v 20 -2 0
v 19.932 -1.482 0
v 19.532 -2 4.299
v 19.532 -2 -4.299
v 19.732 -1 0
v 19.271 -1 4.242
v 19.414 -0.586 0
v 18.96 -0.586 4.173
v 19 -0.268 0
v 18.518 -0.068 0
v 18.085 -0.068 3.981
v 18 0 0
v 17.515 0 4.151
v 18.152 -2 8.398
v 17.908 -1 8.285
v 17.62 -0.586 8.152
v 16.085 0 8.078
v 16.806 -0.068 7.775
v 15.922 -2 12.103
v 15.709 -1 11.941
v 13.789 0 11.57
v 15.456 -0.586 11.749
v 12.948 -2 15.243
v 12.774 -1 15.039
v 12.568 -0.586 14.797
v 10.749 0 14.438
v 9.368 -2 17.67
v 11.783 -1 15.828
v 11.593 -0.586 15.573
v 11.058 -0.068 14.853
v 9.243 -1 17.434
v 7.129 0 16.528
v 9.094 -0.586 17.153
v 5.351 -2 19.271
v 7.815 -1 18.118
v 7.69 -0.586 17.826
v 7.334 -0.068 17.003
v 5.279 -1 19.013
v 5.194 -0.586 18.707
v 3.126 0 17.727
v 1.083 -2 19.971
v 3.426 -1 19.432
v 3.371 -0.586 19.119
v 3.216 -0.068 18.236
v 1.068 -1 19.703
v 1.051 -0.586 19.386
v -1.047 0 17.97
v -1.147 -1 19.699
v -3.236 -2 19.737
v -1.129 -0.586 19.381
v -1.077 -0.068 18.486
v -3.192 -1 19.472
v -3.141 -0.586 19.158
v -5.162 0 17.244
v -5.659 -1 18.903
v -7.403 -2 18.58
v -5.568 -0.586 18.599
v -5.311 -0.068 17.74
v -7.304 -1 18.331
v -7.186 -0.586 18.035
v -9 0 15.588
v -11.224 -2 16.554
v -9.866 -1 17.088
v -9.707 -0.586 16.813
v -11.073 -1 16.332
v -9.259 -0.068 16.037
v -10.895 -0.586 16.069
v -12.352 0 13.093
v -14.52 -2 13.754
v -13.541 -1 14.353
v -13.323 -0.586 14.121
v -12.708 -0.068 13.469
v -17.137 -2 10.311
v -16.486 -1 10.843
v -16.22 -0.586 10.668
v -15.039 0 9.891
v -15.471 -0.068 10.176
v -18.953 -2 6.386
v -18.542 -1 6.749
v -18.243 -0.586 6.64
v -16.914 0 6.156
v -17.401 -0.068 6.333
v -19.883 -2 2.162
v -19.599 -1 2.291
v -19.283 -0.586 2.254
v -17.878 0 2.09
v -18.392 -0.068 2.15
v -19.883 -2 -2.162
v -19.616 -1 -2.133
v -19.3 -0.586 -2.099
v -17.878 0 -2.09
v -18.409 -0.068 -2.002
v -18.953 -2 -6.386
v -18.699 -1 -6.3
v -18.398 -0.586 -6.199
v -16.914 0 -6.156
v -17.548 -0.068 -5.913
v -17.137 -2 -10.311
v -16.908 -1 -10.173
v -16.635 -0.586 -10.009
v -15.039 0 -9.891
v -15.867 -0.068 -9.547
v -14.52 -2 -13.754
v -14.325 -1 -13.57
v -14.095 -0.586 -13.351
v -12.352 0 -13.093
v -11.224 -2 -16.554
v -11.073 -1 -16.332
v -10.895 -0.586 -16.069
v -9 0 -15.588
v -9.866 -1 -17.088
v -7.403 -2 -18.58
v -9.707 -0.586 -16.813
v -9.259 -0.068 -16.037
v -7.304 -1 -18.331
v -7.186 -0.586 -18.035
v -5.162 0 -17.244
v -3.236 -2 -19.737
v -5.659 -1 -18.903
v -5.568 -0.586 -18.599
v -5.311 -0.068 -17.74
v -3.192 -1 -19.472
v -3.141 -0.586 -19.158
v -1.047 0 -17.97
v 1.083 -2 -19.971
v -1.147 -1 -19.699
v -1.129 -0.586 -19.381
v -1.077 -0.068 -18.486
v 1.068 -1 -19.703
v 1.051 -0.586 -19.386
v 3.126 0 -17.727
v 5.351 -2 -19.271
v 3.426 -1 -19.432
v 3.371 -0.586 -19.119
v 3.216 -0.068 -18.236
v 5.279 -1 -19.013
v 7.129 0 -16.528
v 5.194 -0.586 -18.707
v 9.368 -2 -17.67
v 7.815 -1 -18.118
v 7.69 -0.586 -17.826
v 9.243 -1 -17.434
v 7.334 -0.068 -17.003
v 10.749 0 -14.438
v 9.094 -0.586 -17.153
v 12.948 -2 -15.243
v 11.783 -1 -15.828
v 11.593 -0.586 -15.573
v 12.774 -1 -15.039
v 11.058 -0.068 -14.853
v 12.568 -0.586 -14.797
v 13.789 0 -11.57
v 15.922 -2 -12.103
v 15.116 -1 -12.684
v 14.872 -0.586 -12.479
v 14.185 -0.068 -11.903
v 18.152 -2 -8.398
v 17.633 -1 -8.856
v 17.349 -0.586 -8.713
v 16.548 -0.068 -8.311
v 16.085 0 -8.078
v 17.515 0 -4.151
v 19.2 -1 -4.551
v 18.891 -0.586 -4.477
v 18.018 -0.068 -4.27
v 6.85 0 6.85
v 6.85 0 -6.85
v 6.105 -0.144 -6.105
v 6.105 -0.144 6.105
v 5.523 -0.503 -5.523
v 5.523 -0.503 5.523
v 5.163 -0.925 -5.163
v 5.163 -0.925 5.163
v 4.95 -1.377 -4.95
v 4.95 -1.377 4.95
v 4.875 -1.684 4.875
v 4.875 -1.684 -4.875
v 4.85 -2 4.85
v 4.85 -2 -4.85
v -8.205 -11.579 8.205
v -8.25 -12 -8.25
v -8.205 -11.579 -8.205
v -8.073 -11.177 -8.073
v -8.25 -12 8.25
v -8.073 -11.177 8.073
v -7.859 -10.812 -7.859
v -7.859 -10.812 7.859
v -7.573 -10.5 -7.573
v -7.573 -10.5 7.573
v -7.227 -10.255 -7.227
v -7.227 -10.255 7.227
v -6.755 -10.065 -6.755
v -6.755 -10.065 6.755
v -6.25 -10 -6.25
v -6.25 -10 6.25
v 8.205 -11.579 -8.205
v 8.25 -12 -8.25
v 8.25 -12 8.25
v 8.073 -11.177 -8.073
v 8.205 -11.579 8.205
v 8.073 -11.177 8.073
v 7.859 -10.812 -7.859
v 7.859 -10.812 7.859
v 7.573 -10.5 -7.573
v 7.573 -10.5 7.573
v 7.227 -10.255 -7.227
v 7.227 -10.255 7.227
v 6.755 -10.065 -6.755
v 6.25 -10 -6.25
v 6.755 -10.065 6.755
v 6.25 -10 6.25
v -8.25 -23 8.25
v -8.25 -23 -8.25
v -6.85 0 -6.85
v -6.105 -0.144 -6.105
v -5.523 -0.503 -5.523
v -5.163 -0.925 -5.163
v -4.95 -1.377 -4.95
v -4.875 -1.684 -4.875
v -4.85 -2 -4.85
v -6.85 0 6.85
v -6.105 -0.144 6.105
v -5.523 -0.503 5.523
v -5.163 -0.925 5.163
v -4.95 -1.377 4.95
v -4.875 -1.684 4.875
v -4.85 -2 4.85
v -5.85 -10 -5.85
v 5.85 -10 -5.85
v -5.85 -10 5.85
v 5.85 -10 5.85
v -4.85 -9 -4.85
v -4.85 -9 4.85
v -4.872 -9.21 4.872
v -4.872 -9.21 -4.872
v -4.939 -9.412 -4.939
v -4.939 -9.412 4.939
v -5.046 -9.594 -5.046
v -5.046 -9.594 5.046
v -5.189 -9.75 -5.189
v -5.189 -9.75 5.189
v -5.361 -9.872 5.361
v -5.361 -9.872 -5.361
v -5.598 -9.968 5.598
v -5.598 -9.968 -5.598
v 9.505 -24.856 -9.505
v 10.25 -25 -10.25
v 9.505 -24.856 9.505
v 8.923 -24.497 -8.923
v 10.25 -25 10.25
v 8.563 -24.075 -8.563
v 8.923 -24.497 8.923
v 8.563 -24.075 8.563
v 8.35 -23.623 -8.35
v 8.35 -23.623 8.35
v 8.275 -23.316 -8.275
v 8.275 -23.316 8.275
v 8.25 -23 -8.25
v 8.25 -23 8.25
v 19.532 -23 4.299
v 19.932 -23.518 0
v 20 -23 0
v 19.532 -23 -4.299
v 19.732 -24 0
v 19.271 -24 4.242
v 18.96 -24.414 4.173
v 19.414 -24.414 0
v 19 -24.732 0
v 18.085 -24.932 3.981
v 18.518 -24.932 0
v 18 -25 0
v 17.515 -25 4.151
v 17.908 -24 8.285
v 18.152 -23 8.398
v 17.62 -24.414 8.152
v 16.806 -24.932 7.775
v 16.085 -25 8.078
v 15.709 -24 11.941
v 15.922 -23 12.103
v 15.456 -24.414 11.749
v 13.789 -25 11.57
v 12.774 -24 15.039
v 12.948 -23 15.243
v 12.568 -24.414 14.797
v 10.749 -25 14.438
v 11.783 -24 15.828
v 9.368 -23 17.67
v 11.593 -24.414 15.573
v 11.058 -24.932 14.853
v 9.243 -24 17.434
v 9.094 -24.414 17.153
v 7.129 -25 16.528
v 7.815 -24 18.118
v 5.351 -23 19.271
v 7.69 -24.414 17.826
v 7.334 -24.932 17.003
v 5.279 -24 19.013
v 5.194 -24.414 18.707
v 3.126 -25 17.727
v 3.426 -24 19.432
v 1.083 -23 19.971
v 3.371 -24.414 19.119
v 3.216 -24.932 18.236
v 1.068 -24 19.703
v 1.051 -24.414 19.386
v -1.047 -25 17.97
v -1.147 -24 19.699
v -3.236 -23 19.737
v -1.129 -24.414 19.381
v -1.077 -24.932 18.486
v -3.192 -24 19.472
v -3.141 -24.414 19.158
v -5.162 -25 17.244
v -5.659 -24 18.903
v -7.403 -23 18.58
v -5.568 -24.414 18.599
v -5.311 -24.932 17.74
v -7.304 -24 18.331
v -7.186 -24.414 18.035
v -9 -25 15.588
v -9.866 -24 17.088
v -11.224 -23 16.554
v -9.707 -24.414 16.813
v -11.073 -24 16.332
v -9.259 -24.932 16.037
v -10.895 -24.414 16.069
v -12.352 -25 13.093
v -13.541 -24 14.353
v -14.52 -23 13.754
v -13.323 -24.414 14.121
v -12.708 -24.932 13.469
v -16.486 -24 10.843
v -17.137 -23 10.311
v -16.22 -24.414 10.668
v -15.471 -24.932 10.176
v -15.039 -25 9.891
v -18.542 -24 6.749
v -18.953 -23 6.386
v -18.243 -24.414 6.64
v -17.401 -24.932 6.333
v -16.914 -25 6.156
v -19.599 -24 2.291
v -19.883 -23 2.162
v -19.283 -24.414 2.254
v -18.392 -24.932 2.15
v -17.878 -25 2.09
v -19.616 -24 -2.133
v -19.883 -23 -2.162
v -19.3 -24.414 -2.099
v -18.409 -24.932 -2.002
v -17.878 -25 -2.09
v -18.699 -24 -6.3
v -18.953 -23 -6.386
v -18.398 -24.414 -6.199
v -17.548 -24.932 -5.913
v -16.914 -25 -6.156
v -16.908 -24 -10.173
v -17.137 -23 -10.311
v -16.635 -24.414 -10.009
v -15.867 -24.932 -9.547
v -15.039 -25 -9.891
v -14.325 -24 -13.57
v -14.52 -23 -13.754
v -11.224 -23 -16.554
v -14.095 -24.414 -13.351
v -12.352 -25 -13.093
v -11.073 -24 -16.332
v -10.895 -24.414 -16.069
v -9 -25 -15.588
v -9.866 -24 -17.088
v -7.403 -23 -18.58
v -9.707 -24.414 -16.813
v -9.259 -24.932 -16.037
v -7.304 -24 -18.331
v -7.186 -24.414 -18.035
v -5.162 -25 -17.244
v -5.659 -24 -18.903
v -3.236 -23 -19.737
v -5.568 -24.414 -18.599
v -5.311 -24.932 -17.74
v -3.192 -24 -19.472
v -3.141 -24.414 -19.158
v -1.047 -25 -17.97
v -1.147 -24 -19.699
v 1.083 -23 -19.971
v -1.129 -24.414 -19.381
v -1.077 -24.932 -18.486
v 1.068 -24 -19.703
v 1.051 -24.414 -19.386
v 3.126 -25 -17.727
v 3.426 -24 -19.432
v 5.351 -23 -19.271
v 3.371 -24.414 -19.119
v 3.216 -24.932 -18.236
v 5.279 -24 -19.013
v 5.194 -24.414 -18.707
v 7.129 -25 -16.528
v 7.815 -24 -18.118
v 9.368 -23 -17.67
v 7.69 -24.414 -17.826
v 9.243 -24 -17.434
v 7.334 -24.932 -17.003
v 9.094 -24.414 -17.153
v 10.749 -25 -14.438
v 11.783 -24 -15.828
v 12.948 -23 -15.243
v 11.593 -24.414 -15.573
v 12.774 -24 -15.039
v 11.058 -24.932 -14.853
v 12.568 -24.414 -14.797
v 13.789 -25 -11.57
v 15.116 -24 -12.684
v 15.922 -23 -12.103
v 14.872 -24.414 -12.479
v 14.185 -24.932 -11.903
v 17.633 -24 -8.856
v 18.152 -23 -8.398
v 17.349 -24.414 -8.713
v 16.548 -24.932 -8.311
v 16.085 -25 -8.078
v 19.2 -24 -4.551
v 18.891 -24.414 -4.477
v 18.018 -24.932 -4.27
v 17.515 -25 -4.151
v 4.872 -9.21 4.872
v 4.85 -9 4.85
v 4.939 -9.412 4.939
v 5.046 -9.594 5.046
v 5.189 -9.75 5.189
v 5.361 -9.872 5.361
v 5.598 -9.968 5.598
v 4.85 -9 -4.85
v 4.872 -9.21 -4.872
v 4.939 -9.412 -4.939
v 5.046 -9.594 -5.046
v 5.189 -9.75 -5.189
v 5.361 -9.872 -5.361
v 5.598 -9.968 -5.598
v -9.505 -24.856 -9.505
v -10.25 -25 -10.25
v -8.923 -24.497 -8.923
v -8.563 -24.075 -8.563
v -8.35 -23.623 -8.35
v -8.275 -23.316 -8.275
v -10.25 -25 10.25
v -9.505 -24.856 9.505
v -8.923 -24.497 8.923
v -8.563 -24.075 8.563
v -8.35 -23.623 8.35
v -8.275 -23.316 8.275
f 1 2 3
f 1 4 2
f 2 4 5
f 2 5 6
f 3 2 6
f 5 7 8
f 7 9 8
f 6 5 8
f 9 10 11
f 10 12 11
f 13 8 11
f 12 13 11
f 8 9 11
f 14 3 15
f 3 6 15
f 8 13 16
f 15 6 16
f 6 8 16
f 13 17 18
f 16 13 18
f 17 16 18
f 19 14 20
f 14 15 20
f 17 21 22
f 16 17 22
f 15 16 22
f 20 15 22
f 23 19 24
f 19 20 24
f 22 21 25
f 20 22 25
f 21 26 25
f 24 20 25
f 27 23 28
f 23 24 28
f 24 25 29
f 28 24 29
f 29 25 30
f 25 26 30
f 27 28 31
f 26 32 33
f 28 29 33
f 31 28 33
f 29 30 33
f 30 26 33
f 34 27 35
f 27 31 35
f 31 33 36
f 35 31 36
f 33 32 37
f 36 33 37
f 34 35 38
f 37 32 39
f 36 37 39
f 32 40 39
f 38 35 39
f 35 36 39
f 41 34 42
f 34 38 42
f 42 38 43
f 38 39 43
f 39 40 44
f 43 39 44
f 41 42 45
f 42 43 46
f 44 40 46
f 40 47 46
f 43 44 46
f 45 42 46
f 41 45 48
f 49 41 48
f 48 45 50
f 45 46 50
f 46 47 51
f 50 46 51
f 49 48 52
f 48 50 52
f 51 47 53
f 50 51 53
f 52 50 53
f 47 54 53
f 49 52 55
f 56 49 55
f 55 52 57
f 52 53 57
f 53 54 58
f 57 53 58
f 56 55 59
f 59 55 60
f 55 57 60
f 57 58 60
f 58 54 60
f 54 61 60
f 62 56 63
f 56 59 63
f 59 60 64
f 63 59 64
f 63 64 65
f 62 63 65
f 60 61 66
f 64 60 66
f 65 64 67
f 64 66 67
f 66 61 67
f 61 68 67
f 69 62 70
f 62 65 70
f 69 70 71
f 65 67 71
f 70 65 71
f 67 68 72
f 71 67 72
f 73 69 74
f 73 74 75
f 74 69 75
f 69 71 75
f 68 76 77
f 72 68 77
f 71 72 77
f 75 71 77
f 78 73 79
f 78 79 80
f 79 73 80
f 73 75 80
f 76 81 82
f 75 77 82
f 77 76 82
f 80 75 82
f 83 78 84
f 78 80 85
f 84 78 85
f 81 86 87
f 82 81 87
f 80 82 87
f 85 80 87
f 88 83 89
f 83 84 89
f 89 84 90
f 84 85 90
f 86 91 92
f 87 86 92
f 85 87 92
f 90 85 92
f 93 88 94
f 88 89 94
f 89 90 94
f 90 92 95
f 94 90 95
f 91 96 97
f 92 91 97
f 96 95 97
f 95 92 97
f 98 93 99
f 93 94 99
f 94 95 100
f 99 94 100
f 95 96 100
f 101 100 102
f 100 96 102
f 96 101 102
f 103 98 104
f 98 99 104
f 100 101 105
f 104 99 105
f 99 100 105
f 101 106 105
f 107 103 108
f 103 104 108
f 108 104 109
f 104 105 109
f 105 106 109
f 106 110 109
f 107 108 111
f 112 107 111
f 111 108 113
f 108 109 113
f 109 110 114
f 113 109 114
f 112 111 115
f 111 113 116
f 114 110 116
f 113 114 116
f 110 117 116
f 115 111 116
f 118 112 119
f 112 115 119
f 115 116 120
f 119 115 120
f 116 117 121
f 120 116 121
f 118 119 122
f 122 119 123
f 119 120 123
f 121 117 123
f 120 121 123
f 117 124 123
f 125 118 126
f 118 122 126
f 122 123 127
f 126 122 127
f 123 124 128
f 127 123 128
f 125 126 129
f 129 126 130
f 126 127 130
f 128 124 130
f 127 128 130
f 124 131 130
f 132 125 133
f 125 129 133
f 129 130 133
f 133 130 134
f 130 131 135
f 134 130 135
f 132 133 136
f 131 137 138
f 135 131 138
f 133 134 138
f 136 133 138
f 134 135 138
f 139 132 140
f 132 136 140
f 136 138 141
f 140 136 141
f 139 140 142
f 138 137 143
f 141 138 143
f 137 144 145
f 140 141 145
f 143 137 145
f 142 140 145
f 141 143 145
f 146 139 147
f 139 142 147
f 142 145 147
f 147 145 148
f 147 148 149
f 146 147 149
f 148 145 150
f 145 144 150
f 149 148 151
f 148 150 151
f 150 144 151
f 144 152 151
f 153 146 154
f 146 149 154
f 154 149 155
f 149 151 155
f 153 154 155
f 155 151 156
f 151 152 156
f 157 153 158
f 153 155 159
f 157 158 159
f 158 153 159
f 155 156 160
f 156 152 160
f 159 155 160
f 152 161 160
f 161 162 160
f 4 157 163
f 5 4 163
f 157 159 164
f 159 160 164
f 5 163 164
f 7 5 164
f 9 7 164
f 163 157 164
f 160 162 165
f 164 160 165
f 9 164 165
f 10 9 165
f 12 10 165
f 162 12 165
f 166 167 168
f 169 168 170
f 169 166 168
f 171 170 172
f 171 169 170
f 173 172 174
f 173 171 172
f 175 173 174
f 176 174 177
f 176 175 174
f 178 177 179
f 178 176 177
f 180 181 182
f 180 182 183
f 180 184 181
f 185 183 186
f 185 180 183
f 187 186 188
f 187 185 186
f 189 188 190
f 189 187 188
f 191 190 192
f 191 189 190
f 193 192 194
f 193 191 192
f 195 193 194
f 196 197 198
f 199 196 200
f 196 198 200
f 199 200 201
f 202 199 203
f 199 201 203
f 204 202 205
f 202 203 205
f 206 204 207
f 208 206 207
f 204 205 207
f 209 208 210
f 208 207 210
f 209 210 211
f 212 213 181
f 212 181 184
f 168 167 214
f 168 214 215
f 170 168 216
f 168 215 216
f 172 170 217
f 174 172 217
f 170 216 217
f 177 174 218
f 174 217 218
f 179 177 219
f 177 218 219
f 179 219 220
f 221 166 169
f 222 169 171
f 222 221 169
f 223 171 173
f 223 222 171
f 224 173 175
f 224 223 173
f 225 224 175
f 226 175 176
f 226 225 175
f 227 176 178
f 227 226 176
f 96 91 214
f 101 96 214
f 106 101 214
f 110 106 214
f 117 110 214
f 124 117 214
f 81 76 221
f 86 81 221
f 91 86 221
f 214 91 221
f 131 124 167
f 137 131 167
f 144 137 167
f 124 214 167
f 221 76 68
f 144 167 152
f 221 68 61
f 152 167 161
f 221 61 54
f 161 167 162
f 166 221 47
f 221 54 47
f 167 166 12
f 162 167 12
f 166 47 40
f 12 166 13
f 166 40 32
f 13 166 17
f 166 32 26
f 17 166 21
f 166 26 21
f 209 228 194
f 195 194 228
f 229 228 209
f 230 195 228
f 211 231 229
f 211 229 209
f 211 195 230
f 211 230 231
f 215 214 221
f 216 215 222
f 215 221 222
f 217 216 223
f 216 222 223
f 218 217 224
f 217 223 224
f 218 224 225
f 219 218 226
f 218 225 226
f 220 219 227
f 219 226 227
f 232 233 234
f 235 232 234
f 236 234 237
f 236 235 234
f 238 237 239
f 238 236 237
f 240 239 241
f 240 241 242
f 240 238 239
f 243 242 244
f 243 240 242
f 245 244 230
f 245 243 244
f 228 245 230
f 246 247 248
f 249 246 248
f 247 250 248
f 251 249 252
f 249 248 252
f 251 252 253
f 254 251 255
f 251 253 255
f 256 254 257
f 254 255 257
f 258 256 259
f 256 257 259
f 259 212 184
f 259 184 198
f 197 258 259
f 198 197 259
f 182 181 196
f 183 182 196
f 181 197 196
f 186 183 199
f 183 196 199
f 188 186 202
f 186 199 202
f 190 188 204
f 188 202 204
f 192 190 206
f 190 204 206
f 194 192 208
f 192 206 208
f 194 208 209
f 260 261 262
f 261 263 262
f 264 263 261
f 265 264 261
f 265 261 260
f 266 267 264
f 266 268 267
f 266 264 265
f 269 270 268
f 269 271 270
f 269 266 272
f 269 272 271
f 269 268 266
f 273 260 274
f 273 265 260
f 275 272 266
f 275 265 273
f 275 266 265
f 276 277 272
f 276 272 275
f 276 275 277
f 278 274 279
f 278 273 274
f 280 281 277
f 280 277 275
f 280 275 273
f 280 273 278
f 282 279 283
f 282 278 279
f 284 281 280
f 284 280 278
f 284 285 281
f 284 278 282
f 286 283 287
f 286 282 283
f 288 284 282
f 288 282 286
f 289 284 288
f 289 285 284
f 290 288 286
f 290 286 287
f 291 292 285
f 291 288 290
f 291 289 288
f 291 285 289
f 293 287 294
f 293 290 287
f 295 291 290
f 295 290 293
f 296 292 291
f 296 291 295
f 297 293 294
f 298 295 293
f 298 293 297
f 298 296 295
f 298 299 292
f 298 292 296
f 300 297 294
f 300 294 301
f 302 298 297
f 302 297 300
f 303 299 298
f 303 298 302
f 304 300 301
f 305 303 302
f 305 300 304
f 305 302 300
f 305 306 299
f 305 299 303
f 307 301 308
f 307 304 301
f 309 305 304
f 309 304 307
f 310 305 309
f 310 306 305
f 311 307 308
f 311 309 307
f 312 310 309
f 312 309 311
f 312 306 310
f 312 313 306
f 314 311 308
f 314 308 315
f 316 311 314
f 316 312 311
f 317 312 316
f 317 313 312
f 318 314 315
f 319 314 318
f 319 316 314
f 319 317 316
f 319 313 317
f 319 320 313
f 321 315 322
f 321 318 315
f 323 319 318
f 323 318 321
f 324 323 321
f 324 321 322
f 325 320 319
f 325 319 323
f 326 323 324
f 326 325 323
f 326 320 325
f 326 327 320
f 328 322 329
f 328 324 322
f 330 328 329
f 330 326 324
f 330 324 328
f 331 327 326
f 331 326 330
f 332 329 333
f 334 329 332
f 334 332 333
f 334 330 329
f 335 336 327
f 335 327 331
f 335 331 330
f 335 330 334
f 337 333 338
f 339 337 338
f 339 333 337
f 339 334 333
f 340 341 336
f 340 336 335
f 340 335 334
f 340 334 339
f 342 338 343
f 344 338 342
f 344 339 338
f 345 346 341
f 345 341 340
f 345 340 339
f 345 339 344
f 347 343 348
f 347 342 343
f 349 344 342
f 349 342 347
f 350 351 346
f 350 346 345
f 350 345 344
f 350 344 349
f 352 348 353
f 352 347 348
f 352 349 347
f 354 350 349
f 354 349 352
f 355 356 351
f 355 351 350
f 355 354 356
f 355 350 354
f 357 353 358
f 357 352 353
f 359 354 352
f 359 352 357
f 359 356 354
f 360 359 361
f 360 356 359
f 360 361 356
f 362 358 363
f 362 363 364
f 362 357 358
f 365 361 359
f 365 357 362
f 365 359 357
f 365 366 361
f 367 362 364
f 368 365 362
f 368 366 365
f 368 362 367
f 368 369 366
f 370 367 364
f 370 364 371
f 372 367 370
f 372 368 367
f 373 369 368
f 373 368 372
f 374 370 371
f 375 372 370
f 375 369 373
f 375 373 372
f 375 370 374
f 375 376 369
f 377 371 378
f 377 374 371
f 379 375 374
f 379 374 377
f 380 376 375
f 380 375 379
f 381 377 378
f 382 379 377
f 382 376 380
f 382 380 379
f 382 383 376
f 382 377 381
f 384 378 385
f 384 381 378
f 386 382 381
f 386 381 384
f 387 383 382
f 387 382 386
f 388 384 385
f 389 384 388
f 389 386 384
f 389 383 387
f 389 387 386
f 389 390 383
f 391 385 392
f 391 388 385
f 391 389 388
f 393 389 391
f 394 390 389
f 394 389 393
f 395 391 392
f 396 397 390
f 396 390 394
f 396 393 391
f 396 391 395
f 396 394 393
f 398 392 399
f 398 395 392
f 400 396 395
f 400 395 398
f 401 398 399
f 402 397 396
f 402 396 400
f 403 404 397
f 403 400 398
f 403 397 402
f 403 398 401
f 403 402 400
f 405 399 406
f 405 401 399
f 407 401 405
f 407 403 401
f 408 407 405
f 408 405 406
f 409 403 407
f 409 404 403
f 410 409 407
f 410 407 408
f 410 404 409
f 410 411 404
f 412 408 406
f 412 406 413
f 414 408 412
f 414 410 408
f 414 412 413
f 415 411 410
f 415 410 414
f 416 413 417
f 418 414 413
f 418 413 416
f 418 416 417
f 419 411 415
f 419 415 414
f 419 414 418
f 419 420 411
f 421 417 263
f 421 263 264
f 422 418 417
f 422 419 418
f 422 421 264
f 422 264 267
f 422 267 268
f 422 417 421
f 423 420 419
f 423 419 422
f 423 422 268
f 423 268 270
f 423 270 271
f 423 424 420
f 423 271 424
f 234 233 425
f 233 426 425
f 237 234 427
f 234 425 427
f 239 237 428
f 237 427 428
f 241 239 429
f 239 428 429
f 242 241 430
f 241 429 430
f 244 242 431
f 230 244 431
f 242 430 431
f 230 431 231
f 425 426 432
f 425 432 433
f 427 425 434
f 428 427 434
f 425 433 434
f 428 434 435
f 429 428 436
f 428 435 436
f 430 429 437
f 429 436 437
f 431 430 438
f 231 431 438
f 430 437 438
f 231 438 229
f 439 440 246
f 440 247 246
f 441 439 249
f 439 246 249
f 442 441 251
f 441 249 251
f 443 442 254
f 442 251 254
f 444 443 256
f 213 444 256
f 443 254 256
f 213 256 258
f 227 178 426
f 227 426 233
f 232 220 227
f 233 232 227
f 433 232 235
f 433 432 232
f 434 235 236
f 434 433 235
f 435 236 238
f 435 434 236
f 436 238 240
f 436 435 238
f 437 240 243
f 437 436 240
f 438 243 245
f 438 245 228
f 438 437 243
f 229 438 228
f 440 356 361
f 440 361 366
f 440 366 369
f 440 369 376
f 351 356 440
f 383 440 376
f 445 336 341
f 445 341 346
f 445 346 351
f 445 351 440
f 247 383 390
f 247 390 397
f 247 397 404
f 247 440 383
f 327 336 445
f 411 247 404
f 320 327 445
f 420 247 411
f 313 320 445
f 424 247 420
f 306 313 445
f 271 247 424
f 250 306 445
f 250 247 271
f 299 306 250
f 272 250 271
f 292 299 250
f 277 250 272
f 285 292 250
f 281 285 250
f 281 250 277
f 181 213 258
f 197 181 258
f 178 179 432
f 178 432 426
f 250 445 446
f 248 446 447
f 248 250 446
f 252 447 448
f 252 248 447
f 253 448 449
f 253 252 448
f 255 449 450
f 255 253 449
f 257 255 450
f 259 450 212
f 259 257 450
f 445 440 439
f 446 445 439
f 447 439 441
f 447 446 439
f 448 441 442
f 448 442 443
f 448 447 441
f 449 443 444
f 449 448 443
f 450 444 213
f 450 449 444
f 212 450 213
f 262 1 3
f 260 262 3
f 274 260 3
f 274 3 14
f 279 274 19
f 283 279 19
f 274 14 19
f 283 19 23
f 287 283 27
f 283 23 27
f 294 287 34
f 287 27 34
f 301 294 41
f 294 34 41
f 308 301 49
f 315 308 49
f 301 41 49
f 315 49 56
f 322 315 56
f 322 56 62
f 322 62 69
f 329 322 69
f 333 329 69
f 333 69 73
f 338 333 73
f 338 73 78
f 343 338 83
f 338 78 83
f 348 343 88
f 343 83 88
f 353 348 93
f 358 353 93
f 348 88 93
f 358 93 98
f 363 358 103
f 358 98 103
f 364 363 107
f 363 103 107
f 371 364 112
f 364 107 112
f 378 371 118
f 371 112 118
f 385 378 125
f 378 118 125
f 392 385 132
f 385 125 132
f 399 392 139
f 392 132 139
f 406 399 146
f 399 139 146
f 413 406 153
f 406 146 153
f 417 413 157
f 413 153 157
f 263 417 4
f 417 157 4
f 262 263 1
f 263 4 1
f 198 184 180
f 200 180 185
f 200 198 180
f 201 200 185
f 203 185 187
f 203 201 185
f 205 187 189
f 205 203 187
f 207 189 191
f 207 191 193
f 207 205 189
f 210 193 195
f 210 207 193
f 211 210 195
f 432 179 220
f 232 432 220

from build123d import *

# Parameters (mm, degrees)
F0_R     = 20
F1_DEPTH = 25
F2_W     = 16.5
F2_H     = 16.5
F3_DEPTH = 15
F4_W     = 9.7
F4_H     = 9.7
F5_DEPTH = 25
F6_R     = 2
F7_R     = 1


with BuildPart() as f1:
    # F0 (on Front) → F1 (new body)
    with BuildSketch(Plane.XZ):
        Circle(F0_R)
    extrude(amount=F1_DEPTH)

    # F2 (on face) → F3 (cut)
    with BuildSketch(Plane.XZ.offset(25)):
        Rectangle(F2_W, F2_H)
    extrude(amount=-F3_DEPTH, mode=Mode.SUBTRACT)

    # F4 (on face) → F5 (cut)
    with BuildSketch(Plane(origin=(0, 0, 0), x_dir=(-1, 0, 0), z_dir=(0, 1, 0))):
        Rectangle(F4_W, F4_H)
    extrude(amount=-F5_DEPTH, mode=Mode.SUBTRACT)

    # F6
    f6_edges = [f1.edges().sort_by_distance(p)[0] for p in [
        (0, -10, -8.25),
        (-8.25, -10, 0),
        (8.25, -10, 0),
        (0, -10, 8.25),
        (-20, -25, 0),
        (0, -25, 8.25),
        (-8.25, -25, 0),
        (0, -25, -8.25),
        (8.25, -25, 0),
        (-20, 0, 0),
        (-4.85, 0, 0),
        (0, 0, -4.85),
        (4.85, 0, 0),
        (0, 0, 4.85),
    ]]
    fillet(f6_edges, radius=F6_R)

    # F7
    f7_edges = [f1.edges().sort_by_distance(p)[0] for p in [
        (0, -10, -4.85),
        (-4.85, -10, 0),
        (0, -10, 4.85),
        (4.85, -10, 0),
    ]]
    fillet(f7_edges, radius=F7_R)


solid = f1.part
